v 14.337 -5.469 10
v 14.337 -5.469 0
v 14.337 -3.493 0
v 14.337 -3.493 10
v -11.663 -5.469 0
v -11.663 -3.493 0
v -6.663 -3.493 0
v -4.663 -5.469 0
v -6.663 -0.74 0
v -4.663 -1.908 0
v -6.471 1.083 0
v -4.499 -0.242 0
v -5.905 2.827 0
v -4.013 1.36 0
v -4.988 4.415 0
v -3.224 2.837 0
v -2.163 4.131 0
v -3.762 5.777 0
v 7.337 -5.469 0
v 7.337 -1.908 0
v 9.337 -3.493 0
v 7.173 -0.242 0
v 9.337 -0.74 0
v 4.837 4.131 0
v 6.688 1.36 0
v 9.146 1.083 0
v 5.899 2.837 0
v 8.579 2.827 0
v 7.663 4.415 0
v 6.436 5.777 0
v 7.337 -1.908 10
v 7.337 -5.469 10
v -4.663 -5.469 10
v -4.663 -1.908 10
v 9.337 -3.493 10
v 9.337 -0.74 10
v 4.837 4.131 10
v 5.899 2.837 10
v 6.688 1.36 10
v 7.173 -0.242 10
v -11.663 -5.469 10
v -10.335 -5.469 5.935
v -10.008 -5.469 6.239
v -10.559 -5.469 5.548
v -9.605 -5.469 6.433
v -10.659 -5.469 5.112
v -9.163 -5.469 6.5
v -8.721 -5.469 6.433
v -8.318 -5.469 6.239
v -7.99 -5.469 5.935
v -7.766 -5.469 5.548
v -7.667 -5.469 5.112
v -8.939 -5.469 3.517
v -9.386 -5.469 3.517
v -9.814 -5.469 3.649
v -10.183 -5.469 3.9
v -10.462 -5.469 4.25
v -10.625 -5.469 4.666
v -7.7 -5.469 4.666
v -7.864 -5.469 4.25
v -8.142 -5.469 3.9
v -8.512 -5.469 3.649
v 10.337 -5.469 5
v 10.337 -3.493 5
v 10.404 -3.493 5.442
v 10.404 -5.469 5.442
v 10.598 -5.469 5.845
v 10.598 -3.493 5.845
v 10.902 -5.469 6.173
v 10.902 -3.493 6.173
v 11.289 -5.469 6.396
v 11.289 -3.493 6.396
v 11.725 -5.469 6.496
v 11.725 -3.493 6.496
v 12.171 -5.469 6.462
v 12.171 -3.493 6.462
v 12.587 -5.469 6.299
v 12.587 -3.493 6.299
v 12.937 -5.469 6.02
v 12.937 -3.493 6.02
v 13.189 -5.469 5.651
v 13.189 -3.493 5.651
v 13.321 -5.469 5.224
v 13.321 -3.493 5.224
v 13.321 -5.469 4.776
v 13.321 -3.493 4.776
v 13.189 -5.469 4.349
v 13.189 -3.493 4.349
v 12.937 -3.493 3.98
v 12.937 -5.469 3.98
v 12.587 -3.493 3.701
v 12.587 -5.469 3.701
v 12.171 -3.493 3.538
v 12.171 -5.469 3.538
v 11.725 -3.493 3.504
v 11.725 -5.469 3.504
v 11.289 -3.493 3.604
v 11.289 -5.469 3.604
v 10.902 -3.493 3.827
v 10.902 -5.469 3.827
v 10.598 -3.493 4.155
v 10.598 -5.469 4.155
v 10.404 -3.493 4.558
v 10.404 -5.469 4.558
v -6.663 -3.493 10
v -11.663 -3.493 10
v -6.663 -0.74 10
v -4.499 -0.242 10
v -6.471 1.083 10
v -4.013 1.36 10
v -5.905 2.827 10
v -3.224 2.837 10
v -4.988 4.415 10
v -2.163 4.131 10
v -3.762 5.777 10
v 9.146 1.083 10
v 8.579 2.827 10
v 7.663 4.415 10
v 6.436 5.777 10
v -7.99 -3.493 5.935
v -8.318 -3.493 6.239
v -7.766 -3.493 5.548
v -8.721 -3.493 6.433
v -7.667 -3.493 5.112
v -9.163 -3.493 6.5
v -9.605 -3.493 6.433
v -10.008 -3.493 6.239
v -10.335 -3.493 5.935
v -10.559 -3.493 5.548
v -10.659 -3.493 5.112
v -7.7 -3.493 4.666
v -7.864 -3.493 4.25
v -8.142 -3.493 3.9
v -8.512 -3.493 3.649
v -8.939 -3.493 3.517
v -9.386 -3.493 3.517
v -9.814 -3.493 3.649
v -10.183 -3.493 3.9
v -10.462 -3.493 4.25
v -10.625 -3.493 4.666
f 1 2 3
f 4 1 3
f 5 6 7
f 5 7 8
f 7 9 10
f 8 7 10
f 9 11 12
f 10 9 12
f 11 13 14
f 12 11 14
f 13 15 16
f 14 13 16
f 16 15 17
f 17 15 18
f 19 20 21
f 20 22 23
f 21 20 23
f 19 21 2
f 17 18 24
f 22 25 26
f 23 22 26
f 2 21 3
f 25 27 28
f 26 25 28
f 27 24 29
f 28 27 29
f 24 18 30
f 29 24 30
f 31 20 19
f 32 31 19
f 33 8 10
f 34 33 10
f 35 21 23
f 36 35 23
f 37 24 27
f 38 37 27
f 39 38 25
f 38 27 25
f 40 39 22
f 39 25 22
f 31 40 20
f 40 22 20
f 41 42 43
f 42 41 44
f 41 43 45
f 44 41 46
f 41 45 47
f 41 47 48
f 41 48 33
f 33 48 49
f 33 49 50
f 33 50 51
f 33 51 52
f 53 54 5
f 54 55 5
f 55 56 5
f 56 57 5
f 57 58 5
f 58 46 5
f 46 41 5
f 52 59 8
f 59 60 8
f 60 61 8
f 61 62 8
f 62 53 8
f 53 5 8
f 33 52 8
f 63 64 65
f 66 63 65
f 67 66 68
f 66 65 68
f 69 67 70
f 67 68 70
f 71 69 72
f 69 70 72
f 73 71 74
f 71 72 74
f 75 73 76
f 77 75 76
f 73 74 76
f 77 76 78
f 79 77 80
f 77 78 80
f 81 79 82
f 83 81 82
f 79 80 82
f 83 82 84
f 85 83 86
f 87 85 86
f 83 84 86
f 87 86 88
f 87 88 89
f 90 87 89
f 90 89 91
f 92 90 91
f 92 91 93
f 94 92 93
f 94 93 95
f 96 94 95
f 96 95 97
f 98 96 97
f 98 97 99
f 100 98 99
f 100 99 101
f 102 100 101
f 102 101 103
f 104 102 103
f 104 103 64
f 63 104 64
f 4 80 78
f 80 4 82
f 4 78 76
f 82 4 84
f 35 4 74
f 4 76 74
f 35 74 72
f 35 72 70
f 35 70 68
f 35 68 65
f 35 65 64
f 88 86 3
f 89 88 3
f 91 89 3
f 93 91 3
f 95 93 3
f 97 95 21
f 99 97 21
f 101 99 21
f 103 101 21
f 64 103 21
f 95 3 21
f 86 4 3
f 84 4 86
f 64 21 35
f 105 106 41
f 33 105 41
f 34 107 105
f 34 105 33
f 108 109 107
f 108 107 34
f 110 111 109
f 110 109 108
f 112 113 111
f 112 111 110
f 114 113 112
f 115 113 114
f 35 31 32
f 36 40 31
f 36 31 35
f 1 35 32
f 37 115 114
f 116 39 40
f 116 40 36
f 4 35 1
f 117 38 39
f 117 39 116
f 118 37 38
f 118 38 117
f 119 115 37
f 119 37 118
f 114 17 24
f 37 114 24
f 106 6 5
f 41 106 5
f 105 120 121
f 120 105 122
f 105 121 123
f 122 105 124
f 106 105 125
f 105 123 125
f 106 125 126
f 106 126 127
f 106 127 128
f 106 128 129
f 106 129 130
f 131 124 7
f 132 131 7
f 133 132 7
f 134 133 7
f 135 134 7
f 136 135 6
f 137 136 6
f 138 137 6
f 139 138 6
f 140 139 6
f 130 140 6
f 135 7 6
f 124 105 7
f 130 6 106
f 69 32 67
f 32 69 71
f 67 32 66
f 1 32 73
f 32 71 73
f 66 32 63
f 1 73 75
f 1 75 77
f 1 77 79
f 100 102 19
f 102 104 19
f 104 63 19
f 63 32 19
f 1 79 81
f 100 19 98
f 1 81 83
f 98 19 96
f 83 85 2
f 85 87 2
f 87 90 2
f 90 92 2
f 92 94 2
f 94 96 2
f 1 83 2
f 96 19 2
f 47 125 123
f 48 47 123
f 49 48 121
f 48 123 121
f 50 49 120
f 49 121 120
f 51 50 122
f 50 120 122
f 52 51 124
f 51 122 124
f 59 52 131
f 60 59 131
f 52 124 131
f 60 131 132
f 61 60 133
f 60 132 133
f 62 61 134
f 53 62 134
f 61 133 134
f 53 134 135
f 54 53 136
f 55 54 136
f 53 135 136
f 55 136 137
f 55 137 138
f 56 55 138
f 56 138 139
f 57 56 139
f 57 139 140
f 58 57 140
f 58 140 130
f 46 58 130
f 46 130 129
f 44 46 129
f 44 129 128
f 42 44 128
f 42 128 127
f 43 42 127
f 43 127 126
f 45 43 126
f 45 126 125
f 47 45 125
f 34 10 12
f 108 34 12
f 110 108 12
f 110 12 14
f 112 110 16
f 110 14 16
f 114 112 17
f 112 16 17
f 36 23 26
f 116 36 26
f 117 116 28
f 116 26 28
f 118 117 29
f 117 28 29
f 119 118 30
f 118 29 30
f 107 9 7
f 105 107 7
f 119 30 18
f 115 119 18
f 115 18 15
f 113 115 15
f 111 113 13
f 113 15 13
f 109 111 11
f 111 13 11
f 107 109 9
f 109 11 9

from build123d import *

# Parameters (mm, degrees)
RESSALTO_EXTRUS_O1_DEPTH = 10
ESBO_O3_R                = 1.5
CORTE_EXTRUS_O1_DEPTH    = 10


with BuildPart() as part:
    # Esboço2 → Ressalto-extrusão1 (new body)
    with BuildSketch(Plane.XY):
        with BuildLine():
            Line((-2.16273614, 4.130820826), (4.83726386, 4.130820826))
            ThreePointArc((4.83726386, 4.130820826), (6.687556539, 1.360164653), (7.33726386, -1.907556116))
            Line((7.33726386, -1.907556116), (7.33726386, -5.469179174))
            Line((7.33726386, -5.469179174), (14.33726386, -5.469179174))
            Line((14.33726386, -5.469179174), (14.33726386, -3.493237638))
            Line((14.33726386, -3.493237638), (9.33726386, -3.493237638))
            Line((9.33726386, -3.493237638), (9.33726386, -0.739966657))
            ThreePointArc((9.33726386, -0.739966657), (8.579234613, 2.826995847), (6.436166726, 5.777434776))
            Line((6.436166726, 5.777434776), (-3.761639005, 5.777434776))
            ThreePointArc((-3.761639005, 5.777434776), (-5.904706893, 2.826995847), (-6.66273614, -0.739966657))
            Line((-6.66273614, -0.739966657), (-6.66273614, -3.493237638))
            Line((-6.66273614, -3.493237638), (-11.66273614, -3.493237638))
            Line((-11.66273614, -3.493237638), (-11.66273614, -5.469179174))
            Line((-11.66273614, -5.469179174), (-4.66273614, -5.469179174))
            Line((-4.66273614, -5.469179174), (-4.66273614, -1.907556116))
            ThreePointArc((-4.66273614, -1.907556116), (-4.013028819, 1.360164653), (-2.16273614, 4.130820826))
        make_face()
    extrude(amount=RESSALTO_EXTRUS_O1_DEPTH)

    # Esboço3 → Corte-extrusão1 (cut)
    with BuildSketch(Plane(origin=(0, -3.493237638, 0), x_dir=(1, 0, 0), z_dir=(0, 1, 0))):
        with Locations(Location((-9.16273614, -5, 0), (0, 0, 270))):
            Circle(ESBO_O3_R)
        with Locations(Location((11.83726386, -5, 0), (0, 0, 180))):
            Circle(ESBO_O3_R)
    extrude(amount=-CORTE_EXTRUS_O1_DEPTH, mode=Mode.SUBTRACT)


solid = part.part
